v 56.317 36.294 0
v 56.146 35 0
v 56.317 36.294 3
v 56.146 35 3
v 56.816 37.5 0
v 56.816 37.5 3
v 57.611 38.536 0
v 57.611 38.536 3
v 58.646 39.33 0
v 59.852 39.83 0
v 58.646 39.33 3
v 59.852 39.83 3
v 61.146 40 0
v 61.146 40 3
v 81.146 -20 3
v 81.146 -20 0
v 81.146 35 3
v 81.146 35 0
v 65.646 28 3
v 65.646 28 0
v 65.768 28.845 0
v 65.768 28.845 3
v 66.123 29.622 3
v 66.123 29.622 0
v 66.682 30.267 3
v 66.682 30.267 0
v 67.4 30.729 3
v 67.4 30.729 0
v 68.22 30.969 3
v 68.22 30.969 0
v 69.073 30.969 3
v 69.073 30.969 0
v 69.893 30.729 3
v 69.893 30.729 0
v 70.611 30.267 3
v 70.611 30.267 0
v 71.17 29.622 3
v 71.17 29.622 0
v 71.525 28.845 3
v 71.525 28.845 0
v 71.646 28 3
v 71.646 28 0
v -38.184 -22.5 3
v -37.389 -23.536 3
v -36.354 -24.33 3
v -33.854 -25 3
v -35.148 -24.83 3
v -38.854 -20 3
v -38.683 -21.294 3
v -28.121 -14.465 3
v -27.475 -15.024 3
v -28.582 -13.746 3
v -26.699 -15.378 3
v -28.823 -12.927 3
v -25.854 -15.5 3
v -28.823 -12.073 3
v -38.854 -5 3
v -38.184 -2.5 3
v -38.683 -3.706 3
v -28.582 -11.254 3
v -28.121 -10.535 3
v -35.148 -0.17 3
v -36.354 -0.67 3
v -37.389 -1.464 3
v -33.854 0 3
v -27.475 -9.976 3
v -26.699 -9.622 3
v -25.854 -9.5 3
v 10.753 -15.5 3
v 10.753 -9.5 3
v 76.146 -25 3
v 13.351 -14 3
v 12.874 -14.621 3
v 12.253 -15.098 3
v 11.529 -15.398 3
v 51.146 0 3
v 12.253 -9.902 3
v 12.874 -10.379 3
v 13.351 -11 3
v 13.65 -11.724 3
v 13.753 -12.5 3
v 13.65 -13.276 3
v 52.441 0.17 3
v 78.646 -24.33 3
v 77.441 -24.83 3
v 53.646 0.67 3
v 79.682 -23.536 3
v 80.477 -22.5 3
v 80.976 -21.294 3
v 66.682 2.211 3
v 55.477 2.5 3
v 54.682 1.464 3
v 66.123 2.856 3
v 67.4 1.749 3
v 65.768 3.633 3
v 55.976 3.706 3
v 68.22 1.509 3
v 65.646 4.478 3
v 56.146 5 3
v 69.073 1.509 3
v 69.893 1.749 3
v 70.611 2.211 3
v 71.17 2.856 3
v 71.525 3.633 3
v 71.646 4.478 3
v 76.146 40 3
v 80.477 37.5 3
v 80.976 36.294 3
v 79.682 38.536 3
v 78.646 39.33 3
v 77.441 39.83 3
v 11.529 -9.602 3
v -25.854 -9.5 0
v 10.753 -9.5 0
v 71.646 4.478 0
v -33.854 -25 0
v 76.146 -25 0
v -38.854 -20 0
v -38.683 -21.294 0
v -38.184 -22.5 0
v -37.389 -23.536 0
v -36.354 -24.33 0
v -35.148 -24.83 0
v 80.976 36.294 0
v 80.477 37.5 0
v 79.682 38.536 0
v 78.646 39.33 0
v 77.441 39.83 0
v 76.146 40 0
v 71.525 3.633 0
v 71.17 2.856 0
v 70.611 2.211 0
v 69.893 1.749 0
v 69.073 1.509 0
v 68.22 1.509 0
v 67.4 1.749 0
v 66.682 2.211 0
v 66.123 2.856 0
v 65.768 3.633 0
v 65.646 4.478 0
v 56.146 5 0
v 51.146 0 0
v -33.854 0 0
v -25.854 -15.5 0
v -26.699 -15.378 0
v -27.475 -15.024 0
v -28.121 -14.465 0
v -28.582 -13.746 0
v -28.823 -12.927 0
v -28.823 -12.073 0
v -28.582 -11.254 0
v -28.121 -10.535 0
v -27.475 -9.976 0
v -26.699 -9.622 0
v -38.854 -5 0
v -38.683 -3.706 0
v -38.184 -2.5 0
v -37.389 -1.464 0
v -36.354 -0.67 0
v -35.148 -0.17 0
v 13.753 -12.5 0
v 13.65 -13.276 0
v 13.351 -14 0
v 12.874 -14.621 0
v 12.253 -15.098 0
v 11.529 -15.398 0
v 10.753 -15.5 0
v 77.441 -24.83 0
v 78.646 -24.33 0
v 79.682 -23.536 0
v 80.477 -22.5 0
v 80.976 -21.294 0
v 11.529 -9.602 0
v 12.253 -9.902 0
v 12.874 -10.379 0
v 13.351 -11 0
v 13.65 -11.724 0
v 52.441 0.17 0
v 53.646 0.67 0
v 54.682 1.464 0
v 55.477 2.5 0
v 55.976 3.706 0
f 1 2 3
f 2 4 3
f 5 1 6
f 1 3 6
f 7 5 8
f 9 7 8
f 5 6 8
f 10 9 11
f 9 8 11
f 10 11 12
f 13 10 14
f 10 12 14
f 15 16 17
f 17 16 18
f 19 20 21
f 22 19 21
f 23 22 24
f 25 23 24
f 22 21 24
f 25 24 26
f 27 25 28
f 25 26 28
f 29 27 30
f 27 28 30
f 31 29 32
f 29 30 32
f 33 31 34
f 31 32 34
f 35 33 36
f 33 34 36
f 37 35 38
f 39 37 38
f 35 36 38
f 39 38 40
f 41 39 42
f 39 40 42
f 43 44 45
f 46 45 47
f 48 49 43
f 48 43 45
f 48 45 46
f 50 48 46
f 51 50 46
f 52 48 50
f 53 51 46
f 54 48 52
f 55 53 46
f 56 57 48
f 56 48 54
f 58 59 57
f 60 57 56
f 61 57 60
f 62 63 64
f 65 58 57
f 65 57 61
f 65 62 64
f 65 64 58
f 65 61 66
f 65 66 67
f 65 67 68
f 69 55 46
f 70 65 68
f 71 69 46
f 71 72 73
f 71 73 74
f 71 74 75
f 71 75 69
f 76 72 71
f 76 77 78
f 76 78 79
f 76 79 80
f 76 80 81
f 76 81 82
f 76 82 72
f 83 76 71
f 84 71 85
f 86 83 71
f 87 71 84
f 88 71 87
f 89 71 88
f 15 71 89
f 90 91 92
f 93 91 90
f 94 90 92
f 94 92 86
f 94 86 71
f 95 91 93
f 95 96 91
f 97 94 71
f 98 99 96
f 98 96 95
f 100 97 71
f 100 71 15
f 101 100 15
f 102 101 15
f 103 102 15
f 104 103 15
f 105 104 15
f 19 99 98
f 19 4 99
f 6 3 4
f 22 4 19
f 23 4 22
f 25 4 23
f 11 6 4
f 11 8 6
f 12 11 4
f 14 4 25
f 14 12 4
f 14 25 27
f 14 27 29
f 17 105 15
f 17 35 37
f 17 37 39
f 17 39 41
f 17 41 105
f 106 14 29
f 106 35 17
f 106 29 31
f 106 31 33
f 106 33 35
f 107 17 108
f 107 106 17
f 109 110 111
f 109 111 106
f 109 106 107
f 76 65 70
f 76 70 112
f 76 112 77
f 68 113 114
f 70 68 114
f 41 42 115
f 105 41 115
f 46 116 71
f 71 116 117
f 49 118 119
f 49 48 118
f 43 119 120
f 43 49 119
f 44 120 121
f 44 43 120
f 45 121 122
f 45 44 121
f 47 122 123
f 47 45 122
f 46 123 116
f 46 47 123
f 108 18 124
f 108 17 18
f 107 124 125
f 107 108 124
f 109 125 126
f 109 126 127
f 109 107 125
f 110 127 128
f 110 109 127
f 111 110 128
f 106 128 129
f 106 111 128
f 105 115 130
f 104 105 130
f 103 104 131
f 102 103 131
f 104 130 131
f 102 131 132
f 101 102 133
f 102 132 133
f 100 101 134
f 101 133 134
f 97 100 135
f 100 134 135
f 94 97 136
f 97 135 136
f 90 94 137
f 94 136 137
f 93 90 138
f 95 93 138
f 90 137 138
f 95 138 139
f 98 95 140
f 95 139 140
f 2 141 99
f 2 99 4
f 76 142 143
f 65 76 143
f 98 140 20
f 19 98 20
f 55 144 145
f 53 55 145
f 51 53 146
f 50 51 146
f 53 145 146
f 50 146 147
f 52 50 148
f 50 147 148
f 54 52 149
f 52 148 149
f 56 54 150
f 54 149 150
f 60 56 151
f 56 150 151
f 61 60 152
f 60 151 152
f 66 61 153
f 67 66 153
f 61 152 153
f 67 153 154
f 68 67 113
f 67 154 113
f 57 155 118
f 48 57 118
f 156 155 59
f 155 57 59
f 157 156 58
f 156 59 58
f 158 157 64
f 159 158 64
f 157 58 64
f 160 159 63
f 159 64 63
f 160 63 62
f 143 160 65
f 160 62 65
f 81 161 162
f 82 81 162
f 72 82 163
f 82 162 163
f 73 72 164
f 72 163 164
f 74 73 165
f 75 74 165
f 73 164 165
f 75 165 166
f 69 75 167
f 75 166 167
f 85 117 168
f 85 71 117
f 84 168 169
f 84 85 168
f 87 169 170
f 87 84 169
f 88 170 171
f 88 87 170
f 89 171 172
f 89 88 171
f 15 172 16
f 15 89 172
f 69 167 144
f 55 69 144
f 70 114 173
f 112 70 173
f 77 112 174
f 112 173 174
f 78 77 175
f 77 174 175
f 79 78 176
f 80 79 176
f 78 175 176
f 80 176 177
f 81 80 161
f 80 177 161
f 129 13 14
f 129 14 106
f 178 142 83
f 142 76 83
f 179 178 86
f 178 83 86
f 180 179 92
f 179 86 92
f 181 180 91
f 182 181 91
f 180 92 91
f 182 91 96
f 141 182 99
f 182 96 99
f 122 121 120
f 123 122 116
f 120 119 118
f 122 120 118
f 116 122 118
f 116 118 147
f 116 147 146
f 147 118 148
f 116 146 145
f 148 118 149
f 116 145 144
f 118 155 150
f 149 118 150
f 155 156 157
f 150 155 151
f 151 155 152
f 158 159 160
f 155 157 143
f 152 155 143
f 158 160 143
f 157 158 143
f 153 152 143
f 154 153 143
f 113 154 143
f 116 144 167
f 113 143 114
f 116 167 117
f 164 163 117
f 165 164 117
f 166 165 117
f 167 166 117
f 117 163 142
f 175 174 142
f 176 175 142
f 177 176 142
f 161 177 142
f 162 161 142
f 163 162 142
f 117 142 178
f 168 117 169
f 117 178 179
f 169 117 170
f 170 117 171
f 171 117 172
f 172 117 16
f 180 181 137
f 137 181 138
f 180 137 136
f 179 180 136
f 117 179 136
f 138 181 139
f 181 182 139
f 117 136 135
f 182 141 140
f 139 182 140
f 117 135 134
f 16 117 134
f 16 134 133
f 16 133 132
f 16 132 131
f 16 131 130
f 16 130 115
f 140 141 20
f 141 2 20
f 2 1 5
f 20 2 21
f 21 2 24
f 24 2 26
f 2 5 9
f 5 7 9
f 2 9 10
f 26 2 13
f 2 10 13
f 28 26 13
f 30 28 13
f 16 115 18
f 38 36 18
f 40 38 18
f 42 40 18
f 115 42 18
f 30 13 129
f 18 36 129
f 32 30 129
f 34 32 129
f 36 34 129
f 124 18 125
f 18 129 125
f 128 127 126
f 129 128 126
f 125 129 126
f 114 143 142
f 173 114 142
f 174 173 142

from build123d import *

# Parameters (mm, degrees)
F0_W     = 25
F0_H     = 40
F1_DEPTH = 3
F2_R     = 5


with BuildPart() as f1:
    # F0 (on Top) → F1 (new body)
    with BuildSketch(Plane.XY):
        Polygon((56.1464983402, 0), (-38.8535016598, 0), (-38.8535016598, -25), (81.1464983402, -25), (81.1464983402, 0), align=None)
        with BuildLine():
            ThreePointArc((-25.8535016598, -15.5), (-28.8535016598, -12.5), (-25.8535016598, -9.5))
            Line((-25.8535016598, -9.5), (10.752664879, -9.5))
            ThreePointArc((10.752664879, -9.5), (12.8739852225, -10.3786796564), (13.752664879, -12.5))
            ThreePointArc((13.752664879, -12.5), (12.8739852225, -14.6213203436), (10.752664879, -15.5))
            Line((10.752664879, -15.5), (-25.8535016598, -15.5))
        make_face(mode=Mode.SUBTRACT)
        with Locations((68.6464983402, 20)):
            Rectangle(F0_W, F0_H)
        with BuildLine():
            ThreePointArc((65.6464983402, 28), (68.6464983402, 31), (71.6464983402, 28))
            Line((71.6464983402, 28), (71.6464983402, 4.4783727005))
            ThreePointArc((71.6464983402, 4.4783727005), (68.6464983402, 1.4783727005), (65.6464983402, 4.4783727005))
            Line((65.6464983402, 4.4783727005), (65.6464983402, 28))
        make_face(mode=Mode.SUBTRACT)
    extrude(amount=F1_DEPTH)

    # F2
    f2_edges = [f1.edges().sort_by_distance(p)[0] for p in [
        (-38.853502, -25, 1.5),
        (81.146498, -25, 1.5),
        (-38.853502, 0, 1.5),
        (81.146498, 40, 1.5),
        (56.146498, 40, 1.5),
        (56.146498, 0, 1.5),
    ]]
    fillet(f2_edges, radius=F2_R)


solid = f1.part
